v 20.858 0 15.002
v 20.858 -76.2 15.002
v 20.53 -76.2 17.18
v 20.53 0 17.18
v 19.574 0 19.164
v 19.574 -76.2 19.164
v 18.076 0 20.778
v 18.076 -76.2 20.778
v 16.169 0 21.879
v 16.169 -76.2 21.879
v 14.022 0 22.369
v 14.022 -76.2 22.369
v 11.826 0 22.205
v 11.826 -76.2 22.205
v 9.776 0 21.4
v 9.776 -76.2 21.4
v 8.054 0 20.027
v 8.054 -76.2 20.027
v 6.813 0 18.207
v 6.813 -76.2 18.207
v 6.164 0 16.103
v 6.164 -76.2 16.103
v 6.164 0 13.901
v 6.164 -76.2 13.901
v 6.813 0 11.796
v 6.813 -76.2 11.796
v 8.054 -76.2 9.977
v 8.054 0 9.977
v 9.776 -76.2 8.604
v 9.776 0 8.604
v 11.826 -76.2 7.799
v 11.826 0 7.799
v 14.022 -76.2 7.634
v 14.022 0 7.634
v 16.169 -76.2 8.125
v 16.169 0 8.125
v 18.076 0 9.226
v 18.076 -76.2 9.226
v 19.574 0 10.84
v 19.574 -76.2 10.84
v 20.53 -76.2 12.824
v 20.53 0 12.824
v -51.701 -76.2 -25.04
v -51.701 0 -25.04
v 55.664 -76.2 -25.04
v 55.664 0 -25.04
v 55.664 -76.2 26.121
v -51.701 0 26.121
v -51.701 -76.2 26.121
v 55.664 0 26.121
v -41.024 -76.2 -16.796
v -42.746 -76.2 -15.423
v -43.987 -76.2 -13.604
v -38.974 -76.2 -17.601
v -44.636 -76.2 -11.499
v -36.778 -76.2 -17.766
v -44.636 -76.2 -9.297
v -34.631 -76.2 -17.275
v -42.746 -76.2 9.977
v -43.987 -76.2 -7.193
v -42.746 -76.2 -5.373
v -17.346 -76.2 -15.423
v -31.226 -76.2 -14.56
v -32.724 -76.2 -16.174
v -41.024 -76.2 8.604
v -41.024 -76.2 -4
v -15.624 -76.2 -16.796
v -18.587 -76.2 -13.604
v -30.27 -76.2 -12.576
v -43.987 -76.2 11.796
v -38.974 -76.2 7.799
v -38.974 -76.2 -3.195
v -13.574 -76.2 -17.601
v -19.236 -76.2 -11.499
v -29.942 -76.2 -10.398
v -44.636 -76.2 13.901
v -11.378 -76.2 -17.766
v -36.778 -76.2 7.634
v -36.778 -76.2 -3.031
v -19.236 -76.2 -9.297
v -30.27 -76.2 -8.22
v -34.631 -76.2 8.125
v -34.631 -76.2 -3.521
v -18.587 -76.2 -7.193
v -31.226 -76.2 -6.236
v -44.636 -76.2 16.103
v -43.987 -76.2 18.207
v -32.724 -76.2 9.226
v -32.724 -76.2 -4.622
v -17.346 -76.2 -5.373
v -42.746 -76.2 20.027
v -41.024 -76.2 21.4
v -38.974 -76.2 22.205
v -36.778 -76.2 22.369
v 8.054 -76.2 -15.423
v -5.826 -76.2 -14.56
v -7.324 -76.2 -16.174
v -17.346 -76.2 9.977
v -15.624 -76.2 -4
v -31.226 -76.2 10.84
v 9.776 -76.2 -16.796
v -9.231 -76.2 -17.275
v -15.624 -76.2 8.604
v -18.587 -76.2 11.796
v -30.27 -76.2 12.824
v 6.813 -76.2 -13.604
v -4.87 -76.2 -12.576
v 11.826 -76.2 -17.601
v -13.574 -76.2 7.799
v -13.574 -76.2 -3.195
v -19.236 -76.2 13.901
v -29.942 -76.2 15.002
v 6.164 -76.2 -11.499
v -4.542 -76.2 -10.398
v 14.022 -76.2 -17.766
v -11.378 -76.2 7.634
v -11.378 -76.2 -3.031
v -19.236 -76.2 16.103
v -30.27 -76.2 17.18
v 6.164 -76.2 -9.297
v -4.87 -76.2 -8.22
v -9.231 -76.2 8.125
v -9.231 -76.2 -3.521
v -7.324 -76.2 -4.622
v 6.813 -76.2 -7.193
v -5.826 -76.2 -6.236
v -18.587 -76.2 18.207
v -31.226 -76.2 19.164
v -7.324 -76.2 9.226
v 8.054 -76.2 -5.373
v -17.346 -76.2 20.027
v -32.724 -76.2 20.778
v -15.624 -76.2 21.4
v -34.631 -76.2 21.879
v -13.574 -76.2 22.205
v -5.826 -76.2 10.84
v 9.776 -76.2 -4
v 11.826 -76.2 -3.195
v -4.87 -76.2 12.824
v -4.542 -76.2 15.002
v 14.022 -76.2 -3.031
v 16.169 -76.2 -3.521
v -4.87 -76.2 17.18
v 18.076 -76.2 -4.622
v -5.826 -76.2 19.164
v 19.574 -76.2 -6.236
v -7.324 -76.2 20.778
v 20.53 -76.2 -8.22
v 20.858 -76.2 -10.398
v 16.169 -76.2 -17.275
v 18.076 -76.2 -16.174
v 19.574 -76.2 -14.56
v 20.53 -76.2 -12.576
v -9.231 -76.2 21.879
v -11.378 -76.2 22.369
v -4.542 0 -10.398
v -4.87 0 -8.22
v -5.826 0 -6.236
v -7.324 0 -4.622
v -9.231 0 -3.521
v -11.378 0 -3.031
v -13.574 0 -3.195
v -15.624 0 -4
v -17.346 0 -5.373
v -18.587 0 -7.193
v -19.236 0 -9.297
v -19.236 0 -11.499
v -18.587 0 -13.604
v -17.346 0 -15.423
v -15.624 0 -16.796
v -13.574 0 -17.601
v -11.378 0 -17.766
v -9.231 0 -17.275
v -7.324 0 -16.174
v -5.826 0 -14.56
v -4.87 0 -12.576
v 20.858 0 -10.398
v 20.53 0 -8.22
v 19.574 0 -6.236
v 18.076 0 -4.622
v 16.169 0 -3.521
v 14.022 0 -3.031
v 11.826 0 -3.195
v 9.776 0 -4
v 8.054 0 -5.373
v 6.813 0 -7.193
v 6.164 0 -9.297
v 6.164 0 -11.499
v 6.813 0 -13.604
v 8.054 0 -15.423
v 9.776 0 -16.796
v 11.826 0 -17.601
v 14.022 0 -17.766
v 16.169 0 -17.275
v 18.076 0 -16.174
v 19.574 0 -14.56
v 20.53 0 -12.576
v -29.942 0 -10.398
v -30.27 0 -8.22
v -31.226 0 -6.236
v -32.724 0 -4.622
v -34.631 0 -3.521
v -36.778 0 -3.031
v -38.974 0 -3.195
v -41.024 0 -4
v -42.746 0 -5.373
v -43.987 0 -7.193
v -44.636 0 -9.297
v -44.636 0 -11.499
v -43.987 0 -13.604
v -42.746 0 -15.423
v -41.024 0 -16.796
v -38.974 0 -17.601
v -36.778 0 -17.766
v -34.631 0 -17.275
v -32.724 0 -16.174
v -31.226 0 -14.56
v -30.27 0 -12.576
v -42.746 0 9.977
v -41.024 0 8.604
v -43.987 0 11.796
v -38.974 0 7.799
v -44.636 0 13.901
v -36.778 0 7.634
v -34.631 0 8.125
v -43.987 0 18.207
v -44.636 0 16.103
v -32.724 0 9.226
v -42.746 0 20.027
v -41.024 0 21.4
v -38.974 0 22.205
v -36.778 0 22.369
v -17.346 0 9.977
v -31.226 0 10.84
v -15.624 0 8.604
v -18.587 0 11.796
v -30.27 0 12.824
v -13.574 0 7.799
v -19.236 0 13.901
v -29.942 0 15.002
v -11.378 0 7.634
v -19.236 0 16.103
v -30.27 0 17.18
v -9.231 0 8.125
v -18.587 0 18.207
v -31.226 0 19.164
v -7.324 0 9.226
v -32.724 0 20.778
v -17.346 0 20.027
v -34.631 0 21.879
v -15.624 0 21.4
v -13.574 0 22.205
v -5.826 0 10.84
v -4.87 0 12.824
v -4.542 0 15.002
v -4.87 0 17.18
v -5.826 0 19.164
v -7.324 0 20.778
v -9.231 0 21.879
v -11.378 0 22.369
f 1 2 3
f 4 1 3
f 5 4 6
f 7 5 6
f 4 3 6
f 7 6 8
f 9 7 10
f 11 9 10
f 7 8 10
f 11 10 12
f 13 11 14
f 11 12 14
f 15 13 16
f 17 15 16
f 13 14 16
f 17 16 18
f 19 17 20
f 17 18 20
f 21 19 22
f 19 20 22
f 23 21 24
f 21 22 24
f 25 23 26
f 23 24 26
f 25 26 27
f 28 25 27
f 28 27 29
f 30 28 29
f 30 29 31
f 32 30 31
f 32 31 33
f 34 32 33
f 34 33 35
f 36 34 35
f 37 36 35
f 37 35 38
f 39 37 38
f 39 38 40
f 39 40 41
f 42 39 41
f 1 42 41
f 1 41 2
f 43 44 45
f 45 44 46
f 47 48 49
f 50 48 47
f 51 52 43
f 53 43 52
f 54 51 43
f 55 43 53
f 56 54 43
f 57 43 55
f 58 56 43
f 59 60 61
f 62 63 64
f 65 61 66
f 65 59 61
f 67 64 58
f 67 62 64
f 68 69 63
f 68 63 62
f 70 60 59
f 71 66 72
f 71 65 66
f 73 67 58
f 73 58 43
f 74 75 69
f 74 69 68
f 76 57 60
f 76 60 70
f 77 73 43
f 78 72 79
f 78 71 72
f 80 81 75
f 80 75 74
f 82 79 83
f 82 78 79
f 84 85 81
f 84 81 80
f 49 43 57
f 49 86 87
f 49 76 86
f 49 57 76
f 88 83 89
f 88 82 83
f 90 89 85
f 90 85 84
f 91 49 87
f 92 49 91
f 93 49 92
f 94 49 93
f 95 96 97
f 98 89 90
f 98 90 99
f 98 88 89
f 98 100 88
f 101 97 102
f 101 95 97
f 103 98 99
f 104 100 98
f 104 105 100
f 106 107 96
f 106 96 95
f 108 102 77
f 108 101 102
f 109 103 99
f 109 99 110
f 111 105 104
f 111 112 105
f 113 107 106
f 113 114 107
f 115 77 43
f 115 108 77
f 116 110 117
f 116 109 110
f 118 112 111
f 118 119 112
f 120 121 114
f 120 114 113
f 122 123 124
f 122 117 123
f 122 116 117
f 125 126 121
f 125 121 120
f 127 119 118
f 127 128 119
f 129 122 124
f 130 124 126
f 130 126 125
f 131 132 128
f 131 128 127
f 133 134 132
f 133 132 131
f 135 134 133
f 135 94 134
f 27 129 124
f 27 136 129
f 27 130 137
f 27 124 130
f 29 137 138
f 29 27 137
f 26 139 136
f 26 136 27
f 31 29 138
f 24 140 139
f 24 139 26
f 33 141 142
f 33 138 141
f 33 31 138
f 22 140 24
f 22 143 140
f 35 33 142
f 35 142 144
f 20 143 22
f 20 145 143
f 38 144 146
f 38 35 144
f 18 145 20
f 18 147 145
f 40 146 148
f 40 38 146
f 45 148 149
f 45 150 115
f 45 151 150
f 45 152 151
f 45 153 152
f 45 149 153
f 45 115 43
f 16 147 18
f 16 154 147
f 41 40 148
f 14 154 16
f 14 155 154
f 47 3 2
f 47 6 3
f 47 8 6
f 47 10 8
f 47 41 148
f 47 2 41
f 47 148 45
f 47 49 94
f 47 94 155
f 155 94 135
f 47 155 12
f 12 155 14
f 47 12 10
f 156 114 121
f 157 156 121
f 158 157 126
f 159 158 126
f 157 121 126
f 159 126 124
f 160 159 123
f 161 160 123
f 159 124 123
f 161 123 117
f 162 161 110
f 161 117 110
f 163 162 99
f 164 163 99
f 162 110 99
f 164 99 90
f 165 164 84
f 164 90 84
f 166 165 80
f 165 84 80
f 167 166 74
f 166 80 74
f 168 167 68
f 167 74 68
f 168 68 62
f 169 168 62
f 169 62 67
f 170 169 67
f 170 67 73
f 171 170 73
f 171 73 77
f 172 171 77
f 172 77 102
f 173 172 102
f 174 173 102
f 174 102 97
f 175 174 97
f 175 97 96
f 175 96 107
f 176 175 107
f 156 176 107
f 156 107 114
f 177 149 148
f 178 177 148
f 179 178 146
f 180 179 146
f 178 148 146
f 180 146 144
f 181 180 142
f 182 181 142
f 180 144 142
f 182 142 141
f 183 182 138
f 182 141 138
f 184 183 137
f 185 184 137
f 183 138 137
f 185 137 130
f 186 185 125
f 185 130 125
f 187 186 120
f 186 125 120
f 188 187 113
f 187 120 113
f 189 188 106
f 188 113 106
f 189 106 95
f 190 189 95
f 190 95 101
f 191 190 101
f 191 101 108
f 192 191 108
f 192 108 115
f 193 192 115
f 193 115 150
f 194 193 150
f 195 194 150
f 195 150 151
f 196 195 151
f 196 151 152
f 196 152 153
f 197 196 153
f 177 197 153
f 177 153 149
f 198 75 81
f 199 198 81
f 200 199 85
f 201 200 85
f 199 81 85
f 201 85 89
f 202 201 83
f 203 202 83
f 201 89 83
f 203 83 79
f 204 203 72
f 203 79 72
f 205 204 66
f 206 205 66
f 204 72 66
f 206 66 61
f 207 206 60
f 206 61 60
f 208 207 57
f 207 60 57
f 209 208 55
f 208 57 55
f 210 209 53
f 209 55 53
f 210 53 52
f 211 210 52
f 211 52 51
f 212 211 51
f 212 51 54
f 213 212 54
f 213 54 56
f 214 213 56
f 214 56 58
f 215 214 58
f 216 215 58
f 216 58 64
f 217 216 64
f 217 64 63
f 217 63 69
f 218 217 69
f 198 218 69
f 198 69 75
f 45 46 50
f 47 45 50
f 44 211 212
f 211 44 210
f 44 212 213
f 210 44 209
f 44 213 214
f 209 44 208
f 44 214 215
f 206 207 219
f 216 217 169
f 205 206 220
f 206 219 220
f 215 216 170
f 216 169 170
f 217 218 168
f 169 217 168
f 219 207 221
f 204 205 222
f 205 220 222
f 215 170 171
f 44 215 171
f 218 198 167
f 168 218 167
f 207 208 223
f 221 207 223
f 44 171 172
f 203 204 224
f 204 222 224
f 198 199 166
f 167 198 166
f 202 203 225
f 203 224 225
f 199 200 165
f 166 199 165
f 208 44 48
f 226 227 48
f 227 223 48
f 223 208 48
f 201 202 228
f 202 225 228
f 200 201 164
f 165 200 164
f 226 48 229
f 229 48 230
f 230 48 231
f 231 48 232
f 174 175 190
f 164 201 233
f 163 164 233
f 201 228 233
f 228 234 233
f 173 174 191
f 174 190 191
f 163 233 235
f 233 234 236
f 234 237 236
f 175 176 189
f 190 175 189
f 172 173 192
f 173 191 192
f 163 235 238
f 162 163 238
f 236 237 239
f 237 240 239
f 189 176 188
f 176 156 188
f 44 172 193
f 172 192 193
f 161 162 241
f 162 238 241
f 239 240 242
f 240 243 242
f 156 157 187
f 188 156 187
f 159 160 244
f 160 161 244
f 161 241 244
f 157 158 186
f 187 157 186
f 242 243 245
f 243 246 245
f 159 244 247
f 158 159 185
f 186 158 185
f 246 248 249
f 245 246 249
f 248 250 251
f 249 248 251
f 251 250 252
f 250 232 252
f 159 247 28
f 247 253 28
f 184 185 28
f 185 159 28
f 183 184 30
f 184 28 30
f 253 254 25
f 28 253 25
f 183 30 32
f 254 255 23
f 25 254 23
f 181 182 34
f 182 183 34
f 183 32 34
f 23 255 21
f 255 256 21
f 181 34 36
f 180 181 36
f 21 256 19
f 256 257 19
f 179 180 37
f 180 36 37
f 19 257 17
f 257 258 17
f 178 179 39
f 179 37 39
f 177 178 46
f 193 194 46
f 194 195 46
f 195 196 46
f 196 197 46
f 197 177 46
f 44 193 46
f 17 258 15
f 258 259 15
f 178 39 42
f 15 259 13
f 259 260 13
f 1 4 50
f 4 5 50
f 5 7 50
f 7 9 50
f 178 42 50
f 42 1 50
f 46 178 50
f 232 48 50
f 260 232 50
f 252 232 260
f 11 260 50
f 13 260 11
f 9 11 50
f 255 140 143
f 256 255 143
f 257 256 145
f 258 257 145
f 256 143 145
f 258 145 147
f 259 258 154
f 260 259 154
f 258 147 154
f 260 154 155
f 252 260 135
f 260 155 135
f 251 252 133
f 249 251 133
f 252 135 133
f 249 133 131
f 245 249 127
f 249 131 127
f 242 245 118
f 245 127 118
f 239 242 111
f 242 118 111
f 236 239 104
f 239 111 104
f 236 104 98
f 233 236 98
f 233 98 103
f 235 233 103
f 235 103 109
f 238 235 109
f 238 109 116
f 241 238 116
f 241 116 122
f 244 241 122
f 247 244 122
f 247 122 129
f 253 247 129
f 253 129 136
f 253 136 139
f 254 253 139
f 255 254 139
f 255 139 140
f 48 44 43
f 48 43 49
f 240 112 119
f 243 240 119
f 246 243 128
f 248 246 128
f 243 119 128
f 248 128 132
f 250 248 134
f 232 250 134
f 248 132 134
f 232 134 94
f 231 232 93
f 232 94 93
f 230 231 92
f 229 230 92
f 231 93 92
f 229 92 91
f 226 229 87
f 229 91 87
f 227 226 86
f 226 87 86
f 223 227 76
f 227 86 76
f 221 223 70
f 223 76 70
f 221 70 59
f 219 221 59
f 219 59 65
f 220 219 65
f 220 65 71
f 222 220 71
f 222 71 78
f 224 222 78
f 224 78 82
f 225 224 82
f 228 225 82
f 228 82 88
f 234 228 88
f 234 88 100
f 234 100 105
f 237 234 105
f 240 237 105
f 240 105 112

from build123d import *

# Parameters (mm, degrees)
F0_W     = 107.36537
F0_H     = 51.160677
F1_DEPTH = 76.2
F3_R     = 7.388078
F4_DEPTH = 84.074


with BuildPart() as f1:
    # F0 (on Front) → F1 (new body)
    with BuildSketch(Plane.XZ):
        with Locations((1.981586, 0.540432)):
            Rectangle(F0_W, F0_H)
    extrude(amount=F1_DEPTH)

    # F3 (on face) → F4 (cut)
    with BuildSketch(Plane.XZ.offset(76.2)):
        with Locations((-37.330247, 15.001875)):
            Circle(F3_R)
        with Locations((-37.330247, -10.398125)):
            Circle(F3_R)
        with Locations((-11.930247, 15.001875)):
            Circle(F3_R)
        with Locations((-11.930247, -10.398125)):
            Circle(F3_R)
        with Locations((13.469753, 15.001875)):
            Circle(F3_R)
        with Locations((13.469753, -10.398125)):
            Circle(F3_R)
    extrude(amount=-F4_DEPTH, mode=Mode.SUBTRACT)


solid = f1.part
